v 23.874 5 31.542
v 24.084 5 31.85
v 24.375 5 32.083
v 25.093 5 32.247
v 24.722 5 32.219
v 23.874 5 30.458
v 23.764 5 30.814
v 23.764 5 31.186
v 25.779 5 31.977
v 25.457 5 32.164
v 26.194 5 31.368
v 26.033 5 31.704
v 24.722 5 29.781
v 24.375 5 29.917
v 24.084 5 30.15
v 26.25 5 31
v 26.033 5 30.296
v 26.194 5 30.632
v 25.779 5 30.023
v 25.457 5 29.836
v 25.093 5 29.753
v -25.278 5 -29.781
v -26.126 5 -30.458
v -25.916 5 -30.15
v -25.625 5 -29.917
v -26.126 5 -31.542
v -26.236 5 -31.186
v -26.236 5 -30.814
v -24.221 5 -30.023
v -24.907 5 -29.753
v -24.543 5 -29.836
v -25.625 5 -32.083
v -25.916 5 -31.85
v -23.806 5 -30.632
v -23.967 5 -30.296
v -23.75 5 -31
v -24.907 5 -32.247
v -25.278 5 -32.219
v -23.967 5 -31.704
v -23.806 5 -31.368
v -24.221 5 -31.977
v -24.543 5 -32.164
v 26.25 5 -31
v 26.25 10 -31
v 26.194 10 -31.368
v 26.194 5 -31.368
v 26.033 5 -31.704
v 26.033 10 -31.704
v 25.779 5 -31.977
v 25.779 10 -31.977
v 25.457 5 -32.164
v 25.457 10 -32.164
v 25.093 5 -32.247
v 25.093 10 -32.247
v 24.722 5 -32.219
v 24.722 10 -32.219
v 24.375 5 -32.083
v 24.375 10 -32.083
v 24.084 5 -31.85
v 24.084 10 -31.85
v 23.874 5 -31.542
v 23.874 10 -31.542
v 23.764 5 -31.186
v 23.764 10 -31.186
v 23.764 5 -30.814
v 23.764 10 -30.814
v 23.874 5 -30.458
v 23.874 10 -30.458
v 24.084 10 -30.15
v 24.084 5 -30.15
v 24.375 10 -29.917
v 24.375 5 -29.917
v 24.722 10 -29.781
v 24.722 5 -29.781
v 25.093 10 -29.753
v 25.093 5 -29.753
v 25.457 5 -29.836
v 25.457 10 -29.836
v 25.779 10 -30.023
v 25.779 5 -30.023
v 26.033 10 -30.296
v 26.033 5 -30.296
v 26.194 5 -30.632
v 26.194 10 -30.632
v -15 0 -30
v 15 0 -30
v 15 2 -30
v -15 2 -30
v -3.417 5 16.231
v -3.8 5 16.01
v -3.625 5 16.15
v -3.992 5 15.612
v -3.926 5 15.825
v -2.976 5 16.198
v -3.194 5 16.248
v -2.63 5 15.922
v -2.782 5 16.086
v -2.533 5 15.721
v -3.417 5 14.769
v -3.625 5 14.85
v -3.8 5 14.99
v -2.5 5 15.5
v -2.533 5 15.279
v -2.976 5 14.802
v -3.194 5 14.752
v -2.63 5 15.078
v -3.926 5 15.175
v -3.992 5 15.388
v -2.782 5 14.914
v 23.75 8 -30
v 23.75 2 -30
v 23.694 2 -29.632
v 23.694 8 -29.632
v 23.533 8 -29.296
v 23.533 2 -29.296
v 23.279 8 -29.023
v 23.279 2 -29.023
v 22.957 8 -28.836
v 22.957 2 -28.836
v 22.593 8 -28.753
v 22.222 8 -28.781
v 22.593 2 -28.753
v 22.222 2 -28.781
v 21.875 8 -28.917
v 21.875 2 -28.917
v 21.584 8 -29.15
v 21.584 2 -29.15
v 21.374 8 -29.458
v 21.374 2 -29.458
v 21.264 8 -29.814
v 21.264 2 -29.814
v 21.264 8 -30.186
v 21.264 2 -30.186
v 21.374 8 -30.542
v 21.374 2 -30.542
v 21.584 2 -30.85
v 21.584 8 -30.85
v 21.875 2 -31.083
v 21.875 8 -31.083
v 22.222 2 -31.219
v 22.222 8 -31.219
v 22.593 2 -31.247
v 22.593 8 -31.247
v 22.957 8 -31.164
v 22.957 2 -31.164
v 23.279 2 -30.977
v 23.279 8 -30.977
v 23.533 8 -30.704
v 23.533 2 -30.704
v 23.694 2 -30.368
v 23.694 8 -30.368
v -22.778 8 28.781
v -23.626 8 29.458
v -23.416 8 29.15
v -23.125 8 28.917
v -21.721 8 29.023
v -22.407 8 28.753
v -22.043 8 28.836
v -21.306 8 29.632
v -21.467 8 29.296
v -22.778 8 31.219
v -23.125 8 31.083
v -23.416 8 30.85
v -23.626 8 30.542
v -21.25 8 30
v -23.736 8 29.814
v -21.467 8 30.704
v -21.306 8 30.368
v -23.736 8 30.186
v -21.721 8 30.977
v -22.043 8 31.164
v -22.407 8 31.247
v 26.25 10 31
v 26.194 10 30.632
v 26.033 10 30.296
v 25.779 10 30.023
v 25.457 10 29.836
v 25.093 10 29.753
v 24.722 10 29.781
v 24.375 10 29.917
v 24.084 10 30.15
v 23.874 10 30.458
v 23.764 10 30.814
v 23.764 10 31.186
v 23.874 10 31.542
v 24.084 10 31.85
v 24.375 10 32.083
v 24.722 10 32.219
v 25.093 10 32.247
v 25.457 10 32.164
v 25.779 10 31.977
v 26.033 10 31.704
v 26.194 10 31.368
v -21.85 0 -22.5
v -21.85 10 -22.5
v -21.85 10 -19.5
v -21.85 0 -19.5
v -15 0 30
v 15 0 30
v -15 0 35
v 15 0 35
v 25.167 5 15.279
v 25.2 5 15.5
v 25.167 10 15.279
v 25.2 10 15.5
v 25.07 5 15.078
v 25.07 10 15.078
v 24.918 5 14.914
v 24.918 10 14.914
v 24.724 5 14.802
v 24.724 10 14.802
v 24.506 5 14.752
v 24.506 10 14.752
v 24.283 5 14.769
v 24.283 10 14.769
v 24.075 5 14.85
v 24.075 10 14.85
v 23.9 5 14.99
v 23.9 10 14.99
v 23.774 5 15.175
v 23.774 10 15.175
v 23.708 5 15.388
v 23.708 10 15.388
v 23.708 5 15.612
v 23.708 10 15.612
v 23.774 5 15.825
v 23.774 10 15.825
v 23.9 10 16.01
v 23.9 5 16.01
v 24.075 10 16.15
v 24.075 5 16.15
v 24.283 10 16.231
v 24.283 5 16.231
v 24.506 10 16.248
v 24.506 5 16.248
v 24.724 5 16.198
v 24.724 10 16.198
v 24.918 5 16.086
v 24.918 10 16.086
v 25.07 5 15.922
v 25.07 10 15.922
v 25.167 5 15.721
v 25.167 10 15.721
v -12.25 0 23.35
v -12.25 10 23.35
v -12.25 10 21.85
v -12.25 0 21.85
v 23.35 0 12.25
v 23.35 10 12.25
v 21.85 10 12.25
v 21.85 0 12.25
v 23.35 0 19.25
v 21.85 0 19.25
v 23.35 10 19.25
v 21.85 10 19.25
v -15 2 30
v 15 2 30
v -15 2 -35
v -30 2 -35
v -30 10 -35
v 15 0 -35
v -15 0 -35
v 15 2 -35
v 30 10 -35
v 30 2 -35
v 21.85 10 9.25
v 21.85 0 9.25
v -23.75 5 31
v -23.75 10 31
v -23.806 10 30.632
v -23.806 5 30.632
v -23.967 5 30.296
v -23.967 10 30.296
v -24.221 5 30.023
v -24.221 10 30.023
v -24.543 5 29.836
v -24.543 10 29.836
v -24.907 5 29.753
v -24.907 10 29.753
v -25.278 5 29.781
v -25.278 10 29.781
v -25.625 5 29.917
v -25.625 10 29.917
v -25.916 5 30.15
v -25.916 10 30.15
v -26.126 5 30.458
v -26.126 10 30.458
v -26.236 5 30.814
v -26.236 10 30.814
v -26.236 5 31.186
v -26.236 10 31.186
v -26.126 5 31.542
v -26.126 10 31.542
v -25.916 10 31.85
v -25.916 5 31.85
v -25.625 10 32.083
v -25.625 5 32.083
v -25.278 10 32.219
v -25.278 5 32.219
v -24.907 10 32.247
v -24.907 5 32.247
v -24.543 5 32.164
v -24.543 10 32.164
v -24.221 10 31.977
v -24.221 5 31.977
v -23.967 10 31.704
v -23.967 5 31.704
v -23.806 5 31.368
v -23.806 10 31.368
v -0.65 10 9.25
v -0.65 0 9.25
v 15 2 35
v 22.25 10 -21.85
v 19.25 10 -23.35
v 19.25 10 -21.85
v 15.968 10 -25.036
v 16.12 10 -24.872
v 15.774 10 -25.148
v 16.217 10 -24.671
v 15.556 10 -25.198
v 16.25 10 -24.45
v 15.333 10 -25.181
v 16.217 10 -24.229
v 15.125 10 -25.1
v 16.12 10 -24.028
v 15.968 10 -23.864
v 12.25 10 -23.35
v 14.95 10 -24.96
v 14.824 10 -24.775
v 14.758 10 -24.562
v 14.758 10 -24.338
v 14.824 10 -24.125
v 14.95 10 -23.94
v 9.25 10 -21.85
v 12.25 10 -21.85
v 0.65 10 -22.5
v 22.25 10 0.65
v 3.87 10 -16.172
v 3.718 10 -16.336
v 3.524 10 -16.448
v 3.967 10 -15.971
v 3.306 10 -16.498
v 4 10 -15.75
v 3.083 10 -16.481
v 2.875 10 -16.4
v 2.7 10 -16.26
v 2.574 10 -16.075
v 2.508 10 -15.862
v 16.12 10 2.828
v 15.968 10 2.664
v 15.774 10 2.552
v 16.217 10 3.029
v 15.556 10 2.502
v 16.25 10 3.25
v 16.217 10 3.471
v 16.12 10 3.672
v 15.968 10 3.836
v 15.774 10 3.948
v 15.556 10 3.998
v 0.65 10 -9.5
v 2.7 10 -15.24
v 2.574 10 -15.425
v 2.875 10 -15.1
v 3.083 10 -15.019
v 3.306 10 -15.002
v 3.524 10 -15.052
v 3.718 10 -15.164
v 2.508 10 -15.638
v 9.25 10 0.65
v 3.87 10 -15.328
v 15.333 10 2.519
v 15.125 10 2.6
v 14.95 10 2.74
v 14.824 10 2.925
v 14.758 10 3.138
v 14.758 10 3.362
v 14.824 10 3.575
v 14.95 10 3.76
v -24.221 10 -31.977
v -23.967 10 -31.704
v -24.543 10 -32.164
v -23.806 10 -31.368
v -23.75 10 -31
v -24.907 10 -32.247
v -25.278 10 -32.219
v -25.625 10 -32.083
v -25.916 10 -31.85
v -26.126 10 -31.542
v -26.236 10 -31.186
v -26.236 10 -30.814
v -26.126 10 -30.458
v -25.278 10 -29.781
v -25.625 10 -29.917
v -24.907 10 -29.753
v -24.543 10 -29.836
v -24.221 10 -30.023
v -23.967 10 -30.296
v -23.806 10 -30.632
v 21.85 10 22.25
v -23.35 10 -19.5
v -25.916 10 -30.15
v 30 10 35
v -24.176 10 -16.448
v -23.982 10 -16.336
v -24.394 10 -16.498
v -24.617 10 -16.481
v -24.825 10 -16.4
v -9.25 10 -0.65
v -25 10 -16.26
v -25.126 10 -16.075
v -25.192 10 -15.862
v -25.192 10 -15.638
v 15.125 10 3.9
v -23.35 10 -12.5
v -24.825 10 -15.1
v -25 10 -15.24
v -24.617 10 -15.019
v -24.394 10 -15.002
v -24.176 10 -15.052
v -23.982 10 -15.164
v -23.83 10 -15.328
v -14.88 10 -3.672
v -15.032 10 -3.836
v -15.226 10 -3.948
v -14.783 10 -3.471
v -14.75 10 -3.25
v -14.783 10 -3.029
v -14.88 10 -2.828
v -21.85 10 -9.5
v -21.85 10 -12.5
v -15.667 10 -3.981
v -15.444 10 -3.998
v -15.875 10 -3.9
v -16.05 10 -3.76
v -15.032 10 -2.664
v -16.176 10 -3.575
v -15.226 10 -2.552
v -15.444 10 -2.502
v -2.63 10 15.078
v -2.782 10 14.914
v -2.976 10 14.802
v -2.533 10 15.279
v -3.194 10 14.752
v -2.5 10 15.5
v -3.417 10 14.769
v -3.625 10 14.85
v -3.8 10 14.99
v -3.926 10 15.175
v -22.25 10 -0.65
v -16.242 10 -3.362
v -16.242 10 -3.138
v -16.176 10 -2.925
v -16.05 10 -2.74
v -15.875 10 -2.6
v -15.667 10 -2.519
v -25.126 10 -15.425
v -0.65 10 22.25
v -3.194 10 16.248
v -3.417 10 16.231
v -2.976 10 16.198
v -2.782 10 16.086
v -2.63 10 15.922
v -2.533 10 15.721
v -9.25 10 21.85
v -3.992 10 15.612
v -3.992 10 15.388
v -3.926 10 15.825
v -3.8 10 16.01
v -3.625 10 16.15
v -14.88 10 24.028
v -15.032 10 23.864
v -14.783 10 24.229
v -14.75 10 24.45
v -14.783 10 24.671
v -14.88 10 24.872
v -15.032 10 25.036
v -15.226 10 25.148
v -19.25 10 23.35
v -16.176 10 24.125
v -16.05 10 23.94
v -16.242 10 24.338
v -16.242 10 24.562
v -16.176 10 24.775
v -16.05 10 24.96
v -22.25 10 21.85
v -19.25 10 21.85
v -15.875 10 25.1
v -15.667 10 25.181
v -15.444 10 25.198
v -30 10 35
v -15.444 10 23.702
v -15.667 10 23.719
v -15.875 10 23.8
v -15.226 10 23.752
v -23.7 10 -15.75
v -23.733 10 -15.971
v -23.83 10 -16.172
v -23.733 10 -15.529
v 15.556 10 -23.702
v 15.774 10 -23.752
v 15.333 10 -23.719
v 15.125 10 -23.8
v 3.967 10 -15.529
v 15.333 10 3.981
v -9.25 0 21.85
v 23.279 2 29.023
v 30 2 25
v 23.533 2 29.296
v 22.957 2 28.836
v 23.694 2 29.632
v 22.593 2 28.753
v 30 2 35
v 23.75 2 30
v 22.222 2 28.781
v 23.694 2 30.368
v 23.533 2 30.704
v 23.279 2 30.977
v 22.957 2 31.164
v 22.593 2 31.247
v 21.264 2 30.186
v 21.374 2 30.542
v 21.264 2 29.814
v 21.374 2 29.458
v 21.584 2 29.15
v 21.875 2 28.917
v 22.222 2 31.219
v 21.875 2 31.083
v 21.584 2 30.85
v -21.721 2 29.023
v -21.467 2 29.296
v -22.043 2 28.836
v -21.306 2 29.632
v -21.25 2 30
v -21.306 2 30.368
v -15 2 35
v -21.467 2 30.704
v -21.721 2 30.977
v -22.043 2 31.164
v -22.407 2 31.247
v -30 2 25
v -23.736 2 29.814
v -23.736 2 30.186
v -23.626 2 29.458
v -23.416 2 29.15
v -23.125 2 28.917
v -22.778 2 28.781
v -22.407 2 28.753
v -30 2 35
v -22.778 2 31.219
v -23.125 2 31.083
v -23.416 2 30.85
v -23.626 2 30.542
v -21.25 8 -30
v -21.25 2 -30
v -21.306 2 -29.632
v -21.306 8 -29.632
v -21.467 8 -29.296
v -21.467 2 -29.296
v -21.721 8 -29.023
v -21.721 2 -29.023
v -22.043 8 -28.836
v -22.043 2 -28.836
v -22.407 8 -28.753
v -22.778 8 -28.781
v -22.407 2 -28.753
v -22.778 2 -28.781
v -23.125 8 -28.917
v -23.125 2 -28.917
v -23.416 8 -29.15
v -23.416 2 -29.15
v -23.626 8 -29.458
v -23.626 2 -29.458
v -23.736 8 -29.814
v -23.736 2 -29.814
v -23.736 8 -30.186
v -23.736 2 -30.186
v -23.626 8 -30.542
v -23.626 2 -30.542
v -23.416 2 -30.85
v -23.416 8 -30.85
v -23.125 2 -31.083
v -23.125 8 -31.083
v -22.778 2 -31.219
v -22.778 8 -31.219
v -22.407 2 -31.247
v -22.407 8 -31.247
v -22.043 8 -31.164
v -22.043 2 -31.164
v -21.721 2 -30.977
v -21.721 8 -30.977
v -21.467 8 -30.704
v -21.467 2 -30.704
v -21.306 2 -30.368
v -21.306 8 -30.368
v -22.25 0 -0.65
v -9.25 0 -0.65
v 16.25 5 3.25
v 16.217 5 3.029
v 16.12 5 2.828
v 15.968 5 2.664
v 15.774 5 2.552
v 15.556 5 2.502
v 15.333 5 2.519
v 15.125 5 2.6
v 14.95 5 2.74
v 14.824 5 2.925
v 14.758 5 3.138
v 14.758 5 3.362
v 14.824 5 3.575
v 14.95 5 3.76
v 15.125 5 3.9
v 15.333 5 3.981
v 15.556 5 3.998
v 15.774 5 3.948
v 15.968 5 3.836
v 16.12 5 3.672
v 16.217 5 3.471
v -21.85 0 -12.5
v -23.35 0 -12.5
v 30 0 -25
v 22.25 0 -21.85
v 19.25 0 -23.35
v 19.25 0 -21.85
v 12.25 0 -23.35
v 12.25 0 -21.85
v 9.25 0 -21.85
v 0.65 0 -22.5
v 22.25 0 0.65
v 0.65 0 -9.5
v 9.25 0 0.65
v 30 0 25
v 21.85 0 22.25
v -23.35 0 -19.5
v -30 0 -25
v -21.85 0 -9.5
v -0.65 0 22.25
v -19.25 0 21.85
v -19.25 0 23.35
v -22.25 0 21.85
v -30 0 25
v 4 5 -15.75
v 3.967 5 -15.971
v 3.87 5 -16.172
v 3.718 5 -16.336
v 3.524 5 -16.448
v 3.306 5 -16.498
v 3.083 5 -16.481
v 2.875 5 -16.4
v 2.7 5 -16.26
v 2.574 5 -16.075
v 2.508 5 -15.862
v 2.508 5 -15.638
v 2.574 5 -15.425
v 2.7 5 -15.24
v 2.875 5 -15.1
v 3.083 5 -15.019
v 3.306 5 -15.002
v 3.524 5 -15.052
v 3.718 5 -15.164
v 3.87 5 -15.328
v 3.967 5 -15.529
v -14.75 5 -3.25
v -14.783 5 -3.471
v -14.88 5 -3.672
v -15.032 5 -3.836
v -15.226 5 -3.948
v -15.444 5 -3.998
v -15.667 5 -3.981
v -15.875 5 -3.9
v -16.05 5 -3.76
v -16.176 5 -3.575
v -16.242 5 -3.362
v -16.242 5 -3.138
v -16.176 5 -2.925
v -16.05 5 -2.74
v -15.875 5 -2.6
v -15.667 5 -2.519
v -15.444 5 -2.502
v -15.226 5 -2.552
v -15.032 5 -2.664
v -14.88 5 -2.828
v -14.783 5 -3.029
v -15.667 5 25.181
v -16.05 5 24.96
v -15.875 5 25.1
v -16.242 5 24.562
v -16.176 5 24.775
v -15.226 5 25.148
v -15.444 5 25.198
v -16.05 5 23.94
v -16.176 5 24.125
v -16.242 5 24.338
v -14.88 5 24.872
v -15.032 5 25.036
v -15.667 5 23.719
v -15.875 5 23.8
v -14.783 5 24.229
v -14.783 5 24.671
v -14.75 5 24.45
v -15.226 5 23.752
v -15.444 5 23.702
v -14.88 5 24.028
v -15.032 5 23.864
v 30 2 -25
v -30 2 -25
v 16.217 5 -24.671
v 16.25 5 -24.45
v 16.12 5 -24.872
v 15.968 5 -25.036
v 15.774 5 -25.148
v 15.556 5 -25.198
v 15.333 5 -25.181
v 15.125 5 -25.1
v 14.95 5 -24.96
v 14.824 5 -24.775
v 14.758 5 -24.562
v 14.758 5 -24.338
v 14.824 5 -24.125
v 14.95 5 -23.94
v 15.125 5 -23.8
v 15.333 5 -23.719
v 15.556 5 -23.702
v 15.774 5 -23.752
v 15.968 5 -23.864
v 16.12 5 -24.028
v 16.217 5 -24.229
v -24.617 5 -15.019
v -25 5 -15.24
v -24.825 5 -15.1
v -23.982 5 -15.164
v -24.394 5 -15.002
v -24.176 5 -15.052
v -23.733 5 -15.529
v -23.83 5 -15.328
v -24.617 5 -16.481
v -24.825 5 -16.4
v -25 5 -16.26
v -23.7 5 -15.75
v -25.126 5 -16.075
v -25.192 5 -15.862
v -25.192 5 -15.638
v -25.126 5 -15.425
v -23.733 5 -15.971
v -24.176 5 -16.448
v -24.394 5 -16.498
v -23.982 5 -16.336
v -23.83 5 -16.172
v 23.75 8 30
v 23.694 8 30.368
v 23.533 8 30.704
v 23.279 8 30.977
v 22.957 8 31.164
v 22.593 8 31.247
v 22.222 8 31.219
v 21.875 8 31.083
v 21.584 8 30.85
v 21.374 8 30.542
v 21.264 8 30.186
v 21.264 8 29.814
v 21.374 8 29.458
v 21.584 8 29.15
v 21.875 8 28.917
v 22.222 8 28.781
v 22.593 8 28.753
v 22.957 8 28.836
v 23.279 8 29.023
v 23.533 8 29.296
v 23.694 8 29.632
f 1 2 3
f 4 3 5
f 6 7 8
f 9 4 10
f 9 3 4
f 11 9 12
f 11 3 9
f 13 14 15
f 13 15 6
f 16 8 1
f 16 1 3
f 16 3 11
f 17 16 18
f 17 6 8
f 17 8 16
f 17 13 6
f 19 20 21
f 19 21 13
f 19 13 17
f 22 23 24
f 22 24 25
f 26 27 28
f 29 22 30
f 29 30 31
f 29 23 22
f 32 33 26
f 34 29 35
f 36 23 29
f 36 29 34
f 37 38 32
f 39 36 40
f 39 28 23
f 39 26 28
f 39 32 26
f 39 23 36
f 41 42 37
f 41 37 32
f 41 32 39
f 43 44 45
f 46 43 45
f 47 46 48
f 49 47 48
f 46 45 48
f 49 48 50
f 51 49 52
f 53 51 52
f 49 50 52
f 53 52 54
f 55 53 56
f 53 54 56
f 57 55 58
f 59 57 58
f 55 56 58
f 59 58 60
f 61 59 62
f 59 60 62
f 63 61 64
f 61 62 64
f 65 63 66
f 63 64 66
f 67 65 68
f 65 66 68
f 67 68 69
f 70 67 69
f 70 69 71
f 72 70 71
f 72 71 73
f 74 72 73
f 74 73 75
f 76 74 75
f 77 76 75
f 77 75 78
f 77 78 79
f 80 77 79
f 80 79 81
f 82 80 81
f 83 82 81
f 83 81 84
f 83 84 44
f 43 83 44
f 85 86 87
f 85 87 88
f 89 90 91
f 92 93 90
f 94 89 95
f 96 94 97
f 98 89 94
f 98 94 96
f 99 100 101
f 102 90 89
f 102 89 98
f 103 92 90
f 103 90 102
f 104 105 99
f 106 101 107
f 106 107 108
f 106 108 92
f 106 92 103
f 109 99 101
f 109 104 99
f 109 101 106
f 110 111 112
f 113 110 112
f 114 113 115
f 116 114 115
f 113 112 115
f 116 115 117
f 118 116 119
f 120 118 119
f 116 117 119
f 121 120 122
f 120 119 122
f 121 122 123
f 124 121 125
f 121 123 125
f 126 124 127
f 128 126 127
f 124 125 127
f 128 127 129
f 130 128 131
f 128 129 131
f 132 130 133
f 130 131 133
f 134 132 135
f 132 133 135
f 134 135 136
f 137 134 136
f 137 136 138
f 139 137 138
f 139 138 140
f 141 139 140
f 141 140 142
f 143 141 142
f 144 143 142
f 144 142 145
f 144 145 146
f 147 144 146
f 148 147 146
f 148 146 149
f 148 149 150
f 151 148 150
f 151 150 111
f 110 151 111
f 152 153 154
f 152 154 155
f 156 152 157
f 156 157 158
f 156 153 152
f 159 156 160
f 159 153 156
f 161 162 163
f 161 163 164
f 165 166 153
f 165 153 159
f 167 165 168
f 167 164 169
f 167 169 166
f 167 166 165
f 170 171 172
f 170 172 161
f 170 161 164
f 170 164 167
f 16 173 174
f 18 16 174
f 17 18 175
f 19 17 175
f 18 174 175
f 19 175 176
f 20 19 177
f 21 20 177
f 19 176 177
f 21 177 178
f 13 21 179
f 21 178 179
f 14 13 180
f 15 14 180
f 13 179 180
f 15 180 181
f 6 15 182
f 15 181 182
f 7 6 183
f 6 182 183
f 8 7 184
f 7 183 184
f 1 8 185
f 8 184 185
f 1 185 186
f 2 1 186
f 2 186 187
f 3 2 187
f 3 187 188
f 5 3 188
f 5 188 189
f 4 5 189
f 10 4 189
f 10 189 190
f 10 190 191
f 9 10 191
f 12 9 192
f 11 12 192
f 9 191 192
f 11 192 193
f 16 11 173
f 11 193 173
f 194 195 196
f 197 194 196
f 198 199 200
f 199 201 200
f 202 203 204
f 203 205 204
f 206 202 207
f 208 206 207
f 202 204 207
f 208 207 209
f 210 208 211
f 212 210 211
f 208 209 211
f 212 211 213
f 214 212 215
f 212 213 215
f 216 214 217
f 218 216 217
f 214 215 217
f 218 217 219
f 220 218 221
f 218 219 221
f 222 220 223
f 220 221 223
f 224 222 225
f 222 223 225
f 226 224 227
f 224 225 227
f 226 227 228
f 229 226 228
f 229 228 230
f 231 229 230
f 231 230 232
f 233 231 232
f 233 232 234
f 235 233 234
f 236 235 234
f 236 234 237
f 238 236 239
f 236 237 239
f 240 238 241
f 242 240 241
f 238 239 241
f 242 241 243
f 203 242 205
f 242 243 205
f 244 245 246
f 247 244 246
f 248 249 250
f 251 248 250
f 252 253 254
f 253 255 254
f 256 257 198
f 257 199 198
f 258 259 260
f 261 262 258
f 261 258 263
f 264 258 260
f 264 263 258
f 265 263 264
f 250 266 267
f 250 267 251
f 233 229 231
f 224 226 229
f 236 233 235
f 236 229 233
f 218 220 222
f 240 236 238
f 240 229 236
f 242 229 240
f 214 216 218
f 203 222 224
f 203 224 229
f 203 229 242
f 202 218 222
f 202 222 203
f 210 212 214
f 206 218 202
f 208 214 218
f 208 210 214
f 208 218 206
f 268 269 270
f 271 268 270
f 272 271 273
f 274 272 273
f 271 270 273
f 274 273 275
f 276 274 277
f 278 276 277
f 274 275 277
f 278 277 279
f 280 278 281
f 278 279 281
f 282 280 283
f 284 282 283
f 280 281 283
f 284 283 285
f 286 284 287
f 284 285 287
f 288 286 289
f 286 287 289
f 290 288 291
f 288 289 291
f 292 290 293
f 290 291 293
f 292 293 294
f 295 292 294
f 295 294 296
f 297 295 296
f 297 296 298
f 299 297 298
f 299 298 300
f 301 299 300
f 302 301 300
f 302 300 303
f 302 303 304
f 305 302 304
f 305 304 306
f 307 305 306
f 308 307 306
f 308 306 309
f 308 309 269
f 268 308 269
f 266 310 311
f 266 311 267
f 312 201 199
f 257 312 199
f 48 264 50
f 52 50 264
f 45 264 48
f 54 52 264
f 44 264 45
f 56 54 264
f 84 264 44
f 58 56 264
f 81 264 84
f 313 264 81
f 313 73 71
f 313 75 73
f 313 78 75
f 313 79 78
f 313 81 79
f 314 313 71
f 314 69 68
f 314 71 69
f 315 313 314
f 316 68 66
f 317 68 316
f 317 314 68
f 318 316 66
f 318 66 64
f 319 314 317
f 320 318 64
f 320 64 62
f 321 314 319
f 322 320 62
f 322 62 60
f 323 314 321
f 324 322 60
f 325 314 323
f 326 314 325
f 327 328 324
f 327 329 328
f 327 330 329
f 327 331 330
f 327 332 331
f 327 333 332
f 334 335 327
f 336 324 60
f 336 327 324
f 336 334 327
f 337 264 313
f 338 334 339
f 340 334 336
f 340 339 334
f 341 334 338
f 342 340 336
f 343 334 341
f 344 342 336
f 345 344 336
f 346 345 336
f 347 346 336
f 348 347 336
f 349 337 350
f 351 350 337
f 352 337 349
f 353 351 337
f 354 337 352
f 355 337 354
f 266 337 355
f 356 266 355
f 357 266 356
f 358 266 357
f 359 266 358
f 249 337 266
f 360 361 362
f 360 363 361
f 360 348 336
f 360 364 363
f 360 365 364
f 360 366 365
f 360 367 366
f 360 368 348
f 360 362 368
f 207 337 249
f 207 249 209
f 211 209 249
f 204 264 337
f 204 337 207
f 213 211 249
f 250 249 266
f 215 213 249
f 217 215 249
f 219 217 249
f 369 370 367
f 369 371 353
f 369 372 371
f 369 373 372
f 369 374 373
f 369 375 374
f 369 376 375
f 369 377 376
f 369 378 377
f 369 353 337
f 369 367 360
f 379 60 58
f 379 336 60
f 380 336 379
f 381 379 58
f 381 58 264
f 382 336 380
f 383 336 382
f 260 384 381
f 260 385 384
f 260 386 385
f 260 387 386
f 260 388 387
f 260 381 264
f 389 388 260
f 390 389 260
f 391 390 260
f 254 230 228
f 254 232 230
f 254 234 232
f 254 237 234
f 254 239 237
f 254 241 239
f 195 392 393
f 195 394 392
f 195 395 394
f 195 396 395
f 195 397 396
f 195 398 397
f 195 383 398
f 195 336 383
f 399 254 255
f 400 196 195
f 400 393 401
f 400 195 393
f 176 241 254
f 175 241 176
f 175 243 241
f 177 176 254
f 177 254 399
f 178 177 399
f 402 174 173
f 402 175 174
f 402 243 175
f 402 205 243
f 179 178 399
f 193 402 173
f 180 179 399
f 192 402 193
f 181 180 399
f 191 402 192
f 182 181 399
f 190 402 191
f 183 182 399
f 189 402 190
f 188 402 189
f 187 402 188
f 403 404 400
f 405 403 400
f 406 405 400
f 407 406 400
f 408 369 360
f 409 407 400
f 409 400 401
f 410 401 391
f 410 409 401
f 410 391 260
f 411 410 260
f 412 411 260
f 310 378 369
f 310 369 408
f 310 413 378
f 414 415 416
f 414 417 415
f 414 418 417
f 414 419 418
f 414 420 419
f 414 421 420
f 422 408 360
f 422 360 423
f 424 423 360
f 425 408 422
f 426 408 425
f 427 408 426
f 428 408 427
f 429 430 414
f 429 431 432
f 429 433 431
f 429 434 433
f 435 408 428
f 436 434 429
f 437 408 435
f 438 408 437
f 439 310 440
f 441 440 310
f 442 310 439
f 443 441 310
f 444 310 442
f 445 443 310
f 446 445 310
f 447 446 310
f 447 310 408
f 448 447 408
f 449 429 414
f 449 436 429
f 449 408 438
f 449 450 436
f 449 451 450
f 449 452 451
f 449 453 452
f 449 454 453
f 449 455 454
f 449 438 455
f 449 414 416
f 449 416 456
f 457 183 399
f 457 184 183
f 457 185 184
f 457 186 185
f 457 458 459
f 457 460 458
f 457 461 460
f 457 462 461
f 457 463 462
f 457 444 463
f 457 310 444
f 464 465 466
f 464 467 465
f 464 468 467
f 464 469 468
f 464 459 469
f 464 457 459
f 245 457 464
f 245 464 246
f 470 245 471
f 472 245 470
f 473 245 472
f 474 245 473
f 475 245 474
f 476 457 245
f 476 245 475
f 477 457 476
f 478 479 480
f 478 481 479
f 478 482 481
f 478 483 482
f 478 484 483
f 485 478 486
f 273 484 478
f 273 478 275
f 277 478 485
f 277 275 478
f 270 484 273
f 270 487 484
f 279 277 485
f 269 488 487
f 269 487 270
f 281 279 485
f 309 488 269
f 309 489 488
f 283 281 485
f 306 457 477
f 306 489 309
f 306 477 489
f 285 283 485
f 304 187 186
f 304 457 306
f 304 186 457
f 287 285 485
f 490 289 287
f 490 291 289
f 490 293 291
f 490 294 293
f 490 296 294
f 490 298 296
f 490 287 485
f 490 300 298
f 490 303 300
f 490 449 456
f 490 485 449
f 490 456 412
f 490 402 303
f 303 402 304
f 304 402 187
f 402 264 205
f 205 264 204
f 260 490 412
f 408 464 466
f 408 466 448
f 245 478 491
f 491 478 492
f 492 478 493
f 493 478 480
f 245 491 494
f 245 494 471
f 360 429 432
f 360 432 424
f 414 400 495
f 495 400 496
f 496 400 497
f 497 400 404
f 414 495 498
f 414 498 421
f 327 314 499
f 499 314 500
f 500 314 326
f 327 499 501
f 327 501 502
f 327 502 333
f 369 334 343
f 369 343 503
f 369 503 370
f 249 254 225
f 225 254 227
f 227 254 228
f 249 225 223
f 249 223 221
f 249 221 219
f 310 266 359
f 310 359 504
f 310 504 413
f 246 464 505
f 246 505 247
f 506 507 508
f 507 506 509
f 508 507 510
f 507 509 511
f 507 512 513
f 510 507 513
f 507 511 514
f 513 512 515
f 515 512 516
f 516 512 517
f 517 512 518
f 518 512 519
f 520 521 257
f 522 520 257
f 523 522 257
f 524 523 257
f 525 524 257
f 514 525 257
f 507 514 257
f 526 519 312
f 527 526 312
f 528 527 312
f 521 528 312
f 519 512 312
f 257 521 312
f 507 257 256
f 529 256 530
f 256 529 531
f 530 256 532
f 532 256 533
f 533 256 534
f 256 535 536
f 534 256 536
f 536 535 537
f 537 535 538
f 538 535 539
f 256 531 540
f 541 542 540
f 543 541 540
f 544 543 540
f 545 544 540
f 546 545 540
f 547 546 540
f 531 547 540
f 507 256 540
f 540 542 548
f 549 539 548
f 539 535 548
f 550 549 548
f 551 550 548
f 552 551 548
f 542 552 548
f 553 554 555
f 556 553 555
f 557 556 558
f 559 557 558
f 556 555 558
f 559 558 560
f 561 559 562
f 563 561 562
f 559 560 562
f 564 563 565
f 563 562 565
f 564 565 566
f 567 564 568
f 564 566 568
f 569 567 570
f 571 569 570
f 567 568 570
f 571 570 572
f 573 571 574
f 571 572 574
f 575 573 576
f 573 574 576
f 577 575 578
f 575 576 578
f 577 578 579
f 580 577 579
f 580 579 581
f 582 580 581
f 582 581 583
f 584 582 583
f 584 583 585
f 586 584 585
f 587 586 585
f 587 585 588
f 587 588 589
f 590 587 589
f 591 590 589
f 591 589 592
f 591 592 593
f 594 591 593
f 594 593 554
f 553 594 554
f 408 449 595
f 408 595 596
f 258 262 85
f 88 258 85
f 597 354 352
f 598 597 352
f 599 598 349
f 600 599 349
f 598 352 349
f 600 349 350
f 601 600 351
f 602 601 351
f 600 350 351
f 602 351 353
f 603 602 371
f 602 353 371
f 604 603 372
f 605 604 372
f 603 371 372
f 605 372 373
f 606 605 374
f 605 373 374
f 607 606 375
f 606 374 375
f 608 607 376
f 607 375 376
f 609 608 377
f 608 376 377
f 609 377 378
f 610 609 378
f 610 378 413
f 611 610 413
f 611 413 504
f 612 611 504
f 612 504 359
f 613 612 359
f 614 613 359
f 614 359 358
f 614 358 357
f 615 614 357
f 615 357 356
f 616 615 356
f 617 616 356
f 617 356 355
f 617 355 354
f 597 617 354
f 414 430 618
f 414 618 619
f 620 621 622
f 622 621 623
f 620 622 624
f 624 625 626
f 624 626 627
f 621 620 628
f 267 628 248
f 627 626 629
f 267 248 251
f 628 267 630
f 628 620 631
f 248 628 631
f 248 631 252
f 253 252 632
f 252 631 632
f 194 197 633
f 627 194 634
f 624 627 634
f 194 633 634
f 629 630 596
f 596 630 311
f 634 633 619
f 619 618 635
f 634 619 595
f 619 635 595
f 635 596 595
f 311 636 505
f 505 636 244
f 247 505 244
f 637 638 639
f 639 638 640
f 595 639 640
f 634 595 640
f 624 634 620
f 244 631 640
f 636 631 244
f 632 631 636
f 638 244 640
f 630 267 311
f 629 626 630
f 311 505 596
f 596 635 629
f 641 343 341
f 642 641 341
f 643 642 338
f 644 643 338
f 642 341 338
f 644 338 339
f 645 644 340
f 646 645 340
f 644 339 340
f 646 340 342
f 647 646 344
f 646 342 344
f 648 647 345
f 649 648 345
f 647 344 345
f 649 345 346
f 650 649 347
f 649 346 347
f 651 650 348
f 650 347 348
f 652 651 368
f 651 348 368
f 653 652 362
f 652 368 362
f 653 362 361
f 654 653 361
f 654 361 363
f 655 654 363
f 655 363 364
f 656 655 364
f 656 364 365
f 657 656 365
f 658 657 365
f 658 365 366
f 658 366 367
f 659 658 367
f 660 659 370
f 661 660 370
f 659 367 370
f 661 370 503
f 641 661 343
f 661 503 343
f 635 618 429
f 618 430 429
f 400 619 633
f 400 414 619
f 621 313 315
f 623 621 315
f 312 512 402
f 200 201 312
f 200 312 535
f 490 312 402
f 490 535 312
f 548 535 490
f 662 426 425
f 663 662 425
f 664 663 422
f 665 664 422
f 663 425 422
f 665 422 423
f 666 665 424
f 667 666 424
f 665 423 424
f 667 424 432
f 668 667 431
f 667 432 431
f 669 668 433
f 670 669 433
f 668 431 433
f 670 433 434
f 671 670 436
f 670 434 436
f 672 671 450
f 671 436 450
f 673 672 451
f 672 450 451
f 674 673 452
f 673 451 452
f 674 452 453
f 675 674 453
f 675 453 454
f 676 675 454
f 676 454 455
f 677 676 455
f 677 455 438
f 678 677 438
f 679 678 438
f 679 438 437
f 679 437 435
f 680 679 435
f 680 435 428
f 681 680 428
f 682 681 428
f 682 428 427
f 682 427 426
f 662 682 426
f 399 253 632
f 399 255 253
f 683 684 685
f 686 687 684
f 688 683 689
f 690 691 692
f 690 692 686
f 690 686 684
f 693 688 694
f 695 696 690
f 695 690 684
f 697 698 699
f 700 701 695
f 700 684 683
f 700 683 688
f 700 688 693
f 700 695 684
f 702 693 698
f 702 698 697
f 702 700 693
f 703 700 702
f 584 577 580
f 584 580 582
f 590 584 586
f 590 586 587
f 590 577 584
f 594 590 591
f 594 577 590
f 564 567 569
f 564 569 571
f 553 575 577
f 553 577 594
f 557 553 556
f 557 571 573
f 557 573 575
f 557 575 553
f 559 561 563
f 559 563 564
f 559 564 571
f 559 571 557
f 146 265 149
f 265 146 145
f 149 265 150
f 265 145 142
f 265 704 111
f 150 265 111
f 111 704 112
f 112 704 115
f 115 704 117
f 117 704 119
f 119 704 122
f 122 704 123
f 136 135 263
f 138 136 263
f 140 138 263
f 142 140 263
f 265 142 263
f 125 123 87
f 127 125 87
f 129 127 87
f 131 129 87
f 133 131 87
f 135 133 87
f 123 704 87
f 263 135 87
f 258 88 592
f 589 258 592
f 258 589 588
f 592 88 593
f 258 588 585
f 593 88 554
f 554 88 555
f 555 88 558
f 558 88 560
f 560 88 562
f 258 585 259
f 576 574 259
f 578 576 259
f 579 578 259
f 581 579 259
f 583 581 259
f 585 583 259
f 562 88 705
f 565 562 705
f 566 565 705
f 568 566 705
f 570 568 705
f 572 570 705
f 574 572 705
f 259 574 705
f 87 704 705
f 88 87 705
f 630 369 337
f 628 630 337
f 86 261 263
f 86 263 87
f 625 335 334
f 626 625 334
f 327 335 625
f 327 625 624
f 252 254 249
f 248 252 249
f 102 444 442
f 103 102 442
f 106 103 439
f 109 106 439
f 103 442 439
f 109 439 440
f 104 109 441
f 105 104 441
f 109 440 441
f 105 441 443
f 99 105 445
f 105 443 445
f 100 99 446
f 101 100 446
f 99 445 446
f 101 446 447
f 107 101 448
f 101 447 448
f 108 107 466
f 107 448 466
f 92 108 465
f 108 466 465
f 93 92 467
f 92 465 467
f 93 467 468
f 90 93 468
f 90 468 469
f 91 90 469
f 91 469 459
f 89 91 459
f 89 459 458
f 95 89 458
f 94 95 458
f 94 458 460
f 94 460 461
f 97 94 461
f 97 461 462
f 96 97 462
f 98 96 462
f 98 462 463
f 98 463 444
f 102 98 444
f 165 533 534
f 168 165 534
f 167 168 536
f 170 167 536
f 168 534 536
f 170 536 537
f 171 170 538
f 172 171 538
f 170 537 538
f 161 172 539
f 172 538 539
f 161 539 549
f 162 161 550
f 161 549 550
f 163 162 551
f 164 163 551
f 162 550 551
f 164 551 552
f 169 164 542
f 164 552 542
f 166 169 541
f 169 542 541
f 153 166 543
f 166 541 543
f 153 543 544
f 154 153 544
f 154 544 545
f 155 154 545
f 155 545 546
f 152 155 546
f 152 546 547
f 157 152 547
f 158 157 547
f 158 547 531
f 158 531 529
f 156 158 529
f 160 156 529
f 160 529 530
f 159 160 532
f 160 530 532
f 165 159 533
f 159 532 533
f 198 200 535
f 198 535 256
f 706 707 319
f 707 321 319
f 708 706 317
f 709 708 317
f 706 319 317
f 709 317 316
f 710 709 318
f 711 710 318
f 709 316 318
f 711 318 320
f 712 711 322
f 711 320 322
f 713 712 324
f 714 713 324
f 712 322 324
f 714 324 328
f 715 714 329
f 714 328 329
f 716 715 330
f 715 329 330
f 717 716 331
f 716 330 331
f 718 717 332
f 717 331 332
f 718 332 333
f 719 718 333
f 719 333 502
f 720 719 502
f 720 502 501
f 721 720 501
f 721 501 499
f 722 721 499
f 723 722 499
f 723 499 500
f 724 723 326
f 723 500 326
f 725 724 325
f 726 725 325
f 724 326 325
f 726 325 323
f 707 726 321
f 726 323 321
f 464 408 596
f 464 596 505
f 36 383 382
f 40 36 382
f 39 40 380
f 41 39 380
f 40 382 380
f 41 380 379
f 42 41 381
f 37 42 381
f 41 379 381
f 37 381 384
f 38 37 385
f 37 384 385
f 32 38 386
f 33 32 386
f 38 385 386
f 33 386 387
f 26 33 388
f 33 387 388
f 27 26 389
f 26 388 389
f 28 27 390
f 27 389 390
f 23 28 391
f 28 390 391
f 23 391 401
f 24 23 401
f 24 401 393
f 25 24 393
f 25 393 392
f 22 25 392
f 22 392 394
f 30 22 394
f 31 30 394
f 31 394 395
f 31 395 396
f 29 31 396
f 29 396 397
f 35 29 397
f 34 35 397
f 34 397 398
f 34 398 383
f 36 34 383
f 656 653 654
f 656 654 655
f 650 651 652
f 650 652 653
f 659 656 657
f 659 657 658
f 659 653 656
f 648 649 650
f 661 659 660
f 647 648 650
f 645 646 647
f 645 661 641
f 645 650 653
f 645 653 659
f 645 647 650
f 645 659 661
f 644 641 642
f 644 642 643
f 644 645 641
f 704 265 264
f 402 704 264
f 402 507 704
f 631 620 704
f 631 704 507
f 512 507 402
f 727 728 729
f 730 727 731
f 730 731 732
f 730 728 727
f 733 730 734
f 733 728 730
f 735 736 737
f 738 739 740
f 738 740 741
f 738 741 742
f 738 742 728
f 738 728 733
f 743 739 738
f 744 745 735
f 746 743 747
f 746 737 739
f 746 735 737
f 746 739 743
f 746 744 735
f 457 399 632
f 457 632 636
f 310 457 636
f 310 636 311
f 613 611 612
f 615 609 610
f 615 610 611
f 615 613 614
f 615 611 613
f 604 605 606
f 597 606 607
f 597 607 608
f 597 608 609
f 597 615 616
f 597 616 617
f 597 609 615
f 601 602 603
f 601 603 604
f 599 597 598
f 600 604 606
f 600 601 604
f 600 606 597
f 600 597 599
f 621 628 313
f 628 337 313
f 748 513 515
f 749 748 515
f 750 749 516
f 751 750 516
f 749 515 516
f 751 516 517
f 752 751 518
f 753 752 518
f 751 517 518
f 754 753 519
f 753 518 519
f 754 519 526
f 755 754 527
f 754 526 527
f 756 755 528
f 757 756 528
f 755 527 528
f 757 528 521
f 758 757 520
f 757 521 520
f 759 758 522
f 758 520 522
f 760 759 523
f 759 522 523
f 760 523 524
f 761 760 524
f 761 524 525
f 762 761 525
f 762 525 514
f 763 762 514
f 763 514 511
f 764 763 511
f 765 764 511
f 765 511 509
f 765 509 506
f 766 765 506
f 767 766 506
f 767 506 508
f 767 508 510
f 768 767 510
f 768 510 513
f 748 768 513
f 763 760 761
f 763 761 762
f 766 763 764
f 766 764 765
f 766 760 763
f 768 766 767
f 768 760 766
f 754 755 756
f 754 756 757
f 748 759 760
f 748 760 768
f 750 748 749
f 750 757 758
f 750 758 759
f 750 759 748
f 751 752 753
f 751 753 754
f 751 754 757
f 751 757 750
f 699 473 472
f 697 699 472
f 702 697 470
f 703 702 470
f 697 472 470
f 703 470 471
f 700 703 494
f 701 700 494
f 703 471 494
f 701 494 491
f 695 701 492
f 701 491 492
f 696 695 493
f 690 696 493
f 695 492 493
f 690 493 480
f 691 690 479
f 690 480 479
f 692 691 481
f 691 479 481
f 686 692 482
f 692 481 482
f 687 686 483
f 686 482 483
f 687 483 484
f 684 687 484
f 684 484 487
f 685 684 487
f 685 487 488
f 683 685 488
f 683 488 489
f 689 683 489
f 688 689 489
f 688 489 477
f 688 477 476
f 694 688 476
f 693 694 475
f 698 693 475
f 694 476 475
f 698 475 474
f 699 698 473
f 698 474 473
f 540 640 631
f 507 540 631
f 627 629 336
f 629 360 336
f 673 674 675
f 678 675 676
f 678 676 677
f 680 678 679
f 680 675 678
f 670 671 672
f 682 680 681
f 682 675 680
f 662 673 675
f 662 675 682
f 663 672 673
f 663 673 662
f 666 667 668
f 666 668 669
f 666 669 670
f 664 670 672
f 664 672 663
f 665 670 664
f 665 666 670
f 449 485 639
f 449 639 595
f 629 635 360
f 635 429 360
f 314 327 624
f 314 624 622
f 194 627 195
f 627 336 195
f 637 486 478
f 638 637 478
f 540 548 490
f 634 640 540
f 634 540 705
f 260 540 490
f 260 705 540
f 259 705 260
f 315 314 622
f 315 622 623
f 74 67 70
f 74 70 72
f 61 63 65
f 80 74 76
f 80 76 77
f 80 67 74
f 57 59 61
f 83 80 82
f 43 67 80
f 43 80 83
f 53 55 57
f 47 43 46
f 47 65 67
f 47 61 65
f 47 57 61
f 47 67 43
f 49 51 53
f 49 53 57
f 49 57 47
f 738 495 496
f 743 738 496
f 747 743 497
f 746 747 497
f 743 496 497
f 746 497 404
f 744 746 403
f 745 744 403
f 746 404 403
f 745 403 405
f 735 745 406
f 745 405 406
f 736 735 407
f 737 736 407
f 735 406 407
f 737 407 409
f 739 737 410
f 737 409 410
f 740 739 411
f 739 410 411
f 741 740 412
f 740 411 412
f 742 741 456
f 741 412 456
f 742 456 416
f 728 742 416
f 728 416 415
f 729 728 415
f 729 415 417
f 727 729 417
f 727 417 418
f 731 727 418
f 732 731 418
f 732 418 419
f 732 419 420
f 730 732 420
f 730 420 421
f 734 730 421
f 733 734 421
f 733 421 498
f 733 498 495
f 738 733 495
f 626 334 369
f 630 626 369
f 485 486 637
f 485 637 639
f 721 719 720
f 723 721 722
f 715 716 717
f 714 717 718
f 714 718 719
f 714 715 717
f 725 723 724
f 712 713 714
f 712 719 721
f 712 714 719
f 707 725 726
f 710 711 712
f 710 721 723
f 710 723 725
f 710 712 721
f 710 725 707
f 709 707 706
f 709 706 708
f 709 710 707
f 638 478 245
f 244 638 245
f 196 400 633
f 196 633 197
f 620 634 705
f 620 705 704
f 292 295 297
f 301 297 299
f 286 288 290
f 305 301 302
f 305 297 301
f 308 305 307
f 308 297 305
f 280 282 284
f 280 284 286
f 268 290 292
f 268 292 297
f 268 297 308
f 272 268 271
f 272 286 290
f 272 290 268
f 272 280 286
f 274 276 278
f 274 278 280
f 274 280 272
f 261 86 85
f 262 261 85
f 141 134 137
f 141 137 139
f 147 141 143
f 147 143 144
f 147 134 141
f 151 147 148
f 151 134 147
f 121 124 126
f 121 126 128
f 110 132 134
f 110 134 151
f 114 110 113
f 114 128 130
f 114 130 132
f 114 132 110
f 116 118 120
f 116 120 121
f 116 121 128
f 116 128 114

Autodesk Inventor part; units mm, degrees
ref_plane "YZ Plane" through (0, 0, 0) normal (1, 0, 0) x (0, 1, 0)
ref_plane "XZ Plane" through (0, 0, 0) normal (0, 1, 0) x (-1, 0, 0)
ref_plane "XY Plane" through (0, 0, 0) normal (0, 0, 1) x (1, 0, 0)
sketch "Skizze1" plane through (0, 0, 0) normal (0, 1, 0) x (-1, 0, 0)
  line L0 (30, -35) -> (-30, -35)
  line L1 (-30, -35) -> (-30, 35)
  line L2 (-30, 35) -> (30, 35)
  line L3 (30, 35) -> (30, -35)
  line L4 (30, -35) -> (-30, 35) construction
  line L5 (-30, -35) -> (30, 35) construction
  point P0 (0, 0)
  dimension "d0" = 60
  dimension "d1" = 70
extrude "Extrusion1" add sketch "Skizze1" along normal blind 10
sketch "Skizze2" plane through (0, 10, 0) normal (0, 1, 0) x (1, 0, 0)
  circle A0 centre (-15.75, 15.75) radius 1.75
  circle A1 centre (15.75, 15.75) radius 1.75
  circle A2 centre (15.75, -15.75) radius 1.75
  circle A3 centre (-15.75, -15.75) radius 1.75
  line L0 (42, 0) -> (-42, 0) projected
  line L1 (0, 49) -> (0, -49) projected
  point P0 (0, 0)
  dimension "d4" = 31.5
  dimension "d5" = 31.5
  dimension "d6" = 15.75
  dimension "d7" = 31.5
  dimension "d8" = 31.5
  dimension "d9" = 15.75
  dimension "d10" = 15.75
  dimension "d11" = 15.75
  dimension "d12" = 3.5
  dimension "d13" = 3.5
  dimension "d14" = 3.5
  dimension "d15" = 3.5
extrude "Extrusion2" cut sketch "Skizze2" against normal blind 10
sketch "Skizze3" plane through (0, 10, 0) normal (0, 1, 0) x (1, 0, 0)
  circle A0 centre (-15.75, 15.75) radius 1.75 projected
  circle A1 centre (-15.75, 15.75) radius 5
  circle A2 centre (15.75, 15.75) radius 1.75 projected
  circle A3 centre (15.75, 15.75) radius 5
  circle A4 centre (15.75, -15.75) radius 1.75 projected
  circle A5 centre (15.75, -15.75) radius 5
  circle A6 centre (-15.75, -15.75) radius 1.75 projected
  circle A7 centre (-15.75, -15.75) radius 5
  point P0 (0, 0)
  dimension "d18" = 10
  dimension "d19" = 10
  dimension "d20" = 10
  dimension "d21" = 10
extrude "Extrusion3" cut sketch "Skizze3" against normal blind 7 contours A0 | A1 | A2 | A3 | A4 | A5 | A6 | A7
sketch "Skizze6" plane through (0, 0, 0) normal (0, 1, 0) x (-1, 0, 0)
  line L0 (37.5, 25) -> (-37.5, 25)
  line L1 (37.5, -25) -> (-37.5, -25)
  line L2 (37.5, 40) -> (15, 40)
  line L3 (15, 40) -> (15, 30)
  line L4 (-37.5, 40) -> (-15, 40)
  line L5 (-15, 40) -> (-15, 30)
  line L6 (0, -45.47) -> (0, 45.495) projected
  line L7 (37.5, -40) -> (15, -40)
  line L8 (15, -40) -> (15, -30)
  line L9 (-37.5, -40) -> (-15, -40)
  line L10 (-15, -40) -> (-15, -30)
  line L11 (-15, 30) -> (15, 30)
  line L12 (-15, -30) -> (15, -30)
  line L13 (-37.5, 25) -> (-37.5, 40)
  line L14 (37.5, 40) -> (37.5, 25)
  line L15 (-37.5, -25) -> (-37.5, -40)
  line L16 (-30, 35) -> (-30, -35) projected
  line L17 (37.5, -25) -> (37.5, -40)
  point P0 (0, 0)
  dimension "d37" = 10
  dimension "d38" = 15
  dimension "d39" = 15
  dimension "d40" = 75
  dimension "d43" = 10
  dimension "d44" = 15
  dimension "d45" = 15
  dimension "d46" = 22.5
  dimension "d47" = 22.5
  dimension "d48" = 22.5
  dimension "d49" = 75
  dimension "d50" = 22.5
  dimension "d76" = 5
  dimension "d77" = 25
  dimension "d78" = 5
  dimension "d79" = 25
extrude "Extrusion6" cut sketch "Skizze6" along normal blind 2 contours L0 L6 L11 L3 L2 L14 | L0 L13 L4 L5 L11 L6 | L6 L12 L10 L9 L15 L1 | L1 L17 L7 L8 L12 L6
sketch "Skizze7" plane through (0, 2, 0) normal (0, -1, 0) x (1, 0, 0)
  circle A0 centre (-22.5, 30) radius 1.25
  circle A1 centre (22.5, 30) radius 1.25
  circle A2 centre (22.5, -30) radius 1.25
  circle A3 centre (-22.5, -30) radius 1.25
  line L0 (0, 49) -> (0, -49) projected
  line L1 (-42, 0) -> (42, 0) projected
  point P0 (0, 0)
  dimension "d55" = 45
  dimension "d56" = 22.5
  dimension "d57" = 60
  dimension "d58" = 45
  dimension "d59" = 60
  dimension "d60" = 30
  dimension "d61" = 30
  dimension "d62" = 2.5
  dimension "d63" = 2.5
  dimension "d64" = 2.5
  dimension "d65" = 2.5
  dimension "d71" = 22.5
extrude "Extrusion7" cut sketch "Skizze7" against normal blind 6
sketch "Skizze9" plane through (0, 10, 0) normal (0, 1, 0) x (1, 0, 0)
  line L0 (-9.25, -21.85) -> (-22.25, -21.85)
  line L1 (-22.25, -21.85) -> (-22.25, 0.65)
  line L2 (-22.25, 0.65) -> (-9.25, 0.65)
  line L3 (-9.25, 0.65) -> (-9.25, -21.85)
  circle A0 centre (-15.75, -15.75) radius 1.75 projected
  line L4 (21.85, -22.25) -> (-0.65, -22.25)
  line L5 (-0.65, -22.25) -> (-0.65, -9.25)
  line L6 (-0.65, -9.25) -> (21.85, -9.25)
  line L7 (21.85, -9.25) -> (21.85, -22.25)
  line L8 (22.25, 21.85) -> (9.25, 21.85)
  line L9 (9.25, 21.85) -> (9.25, -0.65)
  line L10 (9.25, -0.65) -> (22.25, -0.65)
  line L11 (22.25, -0.65) -> (22.25, 21.85)
  circle A1 centre (15.75, 15.75) radius 1.75 projected
  line L12 (-21.85, 9.5) -> (0.65, 9.5)
  line L13 (0.65, 9.5) -> (0.65, 22.5)
  line L14 (0.65, 22.5) -> (-21.85, 22.5)
  line L15 (-21.85, 22.5) -> (-21.85, 9.5)
  circle A2 centre (15.75, -15.75) radius 1.75 projected
  point P0 (0, 0)
  point P1 (-15.75, 16)
  dimension "d80" = 13
  dimension "d81" = 22.5
  dimension "d82" = 6.5
  dimension "d83" = 6.1
  dimension "d97" = 13
  dimension "d99" = 22.5
  dimension "d101" = 13
  dimension "d102" = 6.5
  dimension "d103" = 6.1
  dimension "d104" = 22.5
  dimension "d105" = 13
  dimension "d106" = 22.5
  dimension "d107" = 6.1
  dimension "d108" = 6.5
  dimension "d164" = 6.5
extrude "Extrusion9" cut sketch "Skizze9" against normal blind 10 contours L0 L1 L2 L3 | L4 L5 L6 L7 | L11 L10 L9 L8 | A1 | L15 L14 L13 L12 | A2
sketch "Skizze10" plane through (0, 10, 0) normal (0, 1, 0) x (1, 0, 0)
  circle A0 centre (-3.25, -15.5) radius 0.75
  circle A1 centre (24.45, -15.5) radius 0.75
  circle A2 centre (15.5, -3.25) radius 0.75
  circle A3 centre (15.5, 24.45) radius 0.75
  circle A4 centre (3.25, 15.75) radius 0.75
  circle A5 centre (-24.45, 15.75) radius 0.75
  circle A6 centre (-15.5, 3.25) radius 0.75
  circle A7 centre (-15.5, -24.45) radius 0.75
  line L0 (-22.25, 0.65) -> (-9.25, 0.65) projected
  line L1 (-9.25, -21.85) -> (-22.25, -21.85) projected
  line L2 (-21.85, 9.5) -> (-21.85, 22.5) projected
  line L3 (0.65, 22.5) -> (0.65, 9.5) projected
  line L4 (9.25, 21.85) -> (22.25, 21.85) projected
  line L5 (22.25, -0.65) -> (9.25, -0.65) projected
  line L6 (21.85, -9.25) -> (21.85, -22.25) projected
  line L7 (-0.65, -22.25) -> (-0.65, -9.25) projected
  line L8 (-9.25, 0.65) -> (-9.25, -21.85) projected
  line L9 (-0.65, -9.25) -> (21.85, -9.25) projected
  line L10 (9.25, -0.65) -> (9.25, 21.85) projected
  line L11 (0.65, 9.5) -> (-21.85, 9.5) projected
  point P0 (0, 0)
  dimension "d109" = 1.5
  dimension "d110" = 1.5
  dimension "d111" = 1.5
  dimension "d112" = 1.5
  dimension "d113" = 1.5
  dimension "d114" = 1.5
  dimension "d115" = 1.5
  dimension "d116" = 1.5
  dimension "d117" = 2.6
  dimension "d118" = 2.6
  dimension "d119" = 2.6
  dimension "d120" = 2.6
  dimension "d121" = 2.6
  dimension "d122" = 2.6
  dimension "d123" = 2.6
  dimension "d124" = 2.6
  dimension "d125" = 6.25
  dimension "d126" = 6.25
  dimension "d127" = 6.25
  dimension "d128" = 6.25
  dimension "d130" = 6.25
  dimension "d131" = 6.25
  dimension "d132" = 6.25
  dimension "d133" = 6.25
extrude "Extrusion10" cut sketch "Skizze10" against normal blind 5
sketch "Skizze11" plane through (0, 10, 0) normal (0, 1, 0) x (1, 0, 0)
  circle A0 centre (25, -31) radius 1.25
  circle A1 centre (-25, -31) radius 1.25
  circle A2 centre (-25, 31) radius 1.25
  circle A3 centre (25, 31) radius 1.25
  line L0 (-30, -35) -> (30, -35) projected
  line L1 (30, -35) -> (30, 35) projected
  point P0 (0, 0)
  dimension "d136" = 50
  dimension "d137" = 62
  dimension "d138" = 50
  dimension "d139" = 62
  dimension "d140" = 4
  dimension "d141" = 5
  dimension "d142" = 5
  dimension "d143" = 4
  dimension "d144" = 2.5
  dimension "d145" = 2.5
  dimension "d146" = 2.5
  dimension "d147" = 2.5
extrude "Extrusion11" cut sketch "Skizze11" against normal blind 5
sketch "Skizze12" plane through (0, 10, 0) normal (0, 1, 0) x (1, 0, 0)
  line L0 (-21.85, 22.5) -> (-21.85, 9.5) projected
  line L1 (-21.85, 12.5) -> (-23.35, 12.5)
  line L2 (-23.35, 12.5) -> (-23.35, 19.5)
  line L3 (-23.35, 19.5) -> (-21.85, 19.5)
  line L4 (-21.85, 19.5) -> (-21.85, 12.5)
  line L5 (9.25, 21.85) -> (22.25, 21.85) projected
  line L6 (19.25, 21.85) -> (12.25, 21.85)
  line L7 (12.25, 21.85) -> (12.25, 23.35)
  line L8 (12.25, 23.35) -> (19.25, 23.35)
  line L9 (19.25, 23.35) -> (19.25, 21.85)
  line L10 (21.85, -9.25) -> (21.85, -22.25) projected
  line L11 (21.85, -19.25) -> (23.35, -19.25)
  line L12 (23.35, -19.25) -> (23.35, -12.25)
  line L13 (23.35, -12.25) -> (21.85, -12.25)
  line L14 (21.85, -12.25) -> (21.85, -19.25)
  line L15 (-9.25, -21.85) -> (-22.25, -21.85) projected
  line L16 (-12.25, -21.85) -> (-19.25, -21.85)
  line L17 (-19.25, -21.85) -> (-19.25, -23.35)
  line L18 (-19.25, -23.35) -> (-12.25, -23.35)
  line L19 (-12.25, -23.35) -> (-12.25, -21.85)
  line L20 (21.85, -22.25) -> (-0.65, -22.25) projected
  line L21 (-0.65, -9.25) -> (21.85, -9.25) projected
  line L22 (-9.25, 0.65) -> (-9.25, -21.85) projected
  line L23 (-22.25, -21.85) -> (-22.25, 0.65) projected
  line L24 (-21.85, 22.5) -> (0.65, 22.5) projected
  line L25 (0.65, 9.5) -> (-21.85, 9.5) projected
  line L26 (9.25, -0.65) -> (9.25, 21.85) projected
  line L27 (22.25, 21.85) -> (22.25, -0.65) projected
  point P0 (0, 0)
  point P1 (-21.85, 19.5)
  dimension "d150" = 3
  dimension "d151" = 3
  dimension "d152" = 1.5
  dimension "d153" = 3
  dimension "d154" = 3
  dimension "d155" = 1.5
  dimension "d156" = 3
  dimension "d157" = 3
  dimension "d158" = 1.5
  dimension "d159" = 3
  dimension "d160" = 3
  dimension "d161" = 1.5
extrude "Extrusion12" cut sketch "Skizze12" against normal blind 10
equation "\"d6\" = 0.5 * d5"
equation "\"d9\" = 0.5 * d7"
equation "\"d10\" = 0.5 * d8"
equation "\"d11\" = 0.5 * d5"
equation "\"d56\" = 0.5 * d55"
equation "\"d60\" = 0.5 * d57"
equation "\"d61\" = 0.5 * d59"
equation "\"d71\" = 0.5 * d58"
equation "\"d82\" = 0.5 * d80"
equation "\"d102\" = 0.5 * d101"
equation "\"d108\" = 0.5 * d105"
equation "\"d164\" = 0.5 * d97"
properties part number "Fuehrungsgrundplatte_V2"
